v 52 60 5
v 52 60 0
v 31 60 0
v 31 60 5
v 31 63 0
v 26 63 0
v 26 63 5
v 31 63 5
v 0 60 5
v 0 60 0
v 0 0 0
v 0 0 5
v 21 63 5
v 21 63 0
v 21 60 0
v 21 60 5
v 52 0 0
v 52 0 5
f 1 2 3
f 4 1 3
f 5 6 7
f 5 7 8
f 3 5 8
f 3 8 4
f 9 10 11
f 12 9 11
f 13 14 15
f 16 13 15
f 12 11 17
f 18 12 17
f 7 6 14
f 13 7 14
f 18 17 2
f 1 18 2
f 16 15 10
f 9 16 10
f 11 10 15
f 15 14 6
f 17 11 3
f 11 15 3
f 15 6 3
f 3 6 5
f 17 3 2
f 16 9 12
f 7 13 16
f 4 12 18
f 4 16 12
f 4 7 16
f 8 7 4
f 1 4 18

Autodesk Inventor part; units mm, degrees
ref_plane "YZ Plane" through (0, 0, 0) normal (1, 0, 0) x (0, 1, 0)
ref_plane "XZ Plane" through (0, 0, 0) normal (0, 1, 0) x (-1, 0, 0)
ref_plane "XY Plane" through (0, 0, 0) normal (0, 0, 1) x (1, 0, 0)
sketch "Boceto1" plane through (0, 0, 0) normal (0, 0, 1) x (1, 0, 0)
  line L0 (0, 0) -> (52, 0)
  line L1 (52, 0) -> (52, 60)
  line L2 (0, 60) -> (0, 0)
  line L3 (26, 63) -> (21, 63)
  line L4 (21, 63) -> (21, 60)
  line L5 (26, 63) -> (31, 63)
  line L6 (31, 63) -> (31, 60)
  line L7 (52, 60) -> (31, 60)
  line L8 (21, 60) -> (0, 60)
  dimension "d0" = 52
  dimension "d1" = 60
extrude "Extrusión1" add sketch "Boceto1" along normal blind 5
properties part number "bateria" material "Aluminum 6061"
